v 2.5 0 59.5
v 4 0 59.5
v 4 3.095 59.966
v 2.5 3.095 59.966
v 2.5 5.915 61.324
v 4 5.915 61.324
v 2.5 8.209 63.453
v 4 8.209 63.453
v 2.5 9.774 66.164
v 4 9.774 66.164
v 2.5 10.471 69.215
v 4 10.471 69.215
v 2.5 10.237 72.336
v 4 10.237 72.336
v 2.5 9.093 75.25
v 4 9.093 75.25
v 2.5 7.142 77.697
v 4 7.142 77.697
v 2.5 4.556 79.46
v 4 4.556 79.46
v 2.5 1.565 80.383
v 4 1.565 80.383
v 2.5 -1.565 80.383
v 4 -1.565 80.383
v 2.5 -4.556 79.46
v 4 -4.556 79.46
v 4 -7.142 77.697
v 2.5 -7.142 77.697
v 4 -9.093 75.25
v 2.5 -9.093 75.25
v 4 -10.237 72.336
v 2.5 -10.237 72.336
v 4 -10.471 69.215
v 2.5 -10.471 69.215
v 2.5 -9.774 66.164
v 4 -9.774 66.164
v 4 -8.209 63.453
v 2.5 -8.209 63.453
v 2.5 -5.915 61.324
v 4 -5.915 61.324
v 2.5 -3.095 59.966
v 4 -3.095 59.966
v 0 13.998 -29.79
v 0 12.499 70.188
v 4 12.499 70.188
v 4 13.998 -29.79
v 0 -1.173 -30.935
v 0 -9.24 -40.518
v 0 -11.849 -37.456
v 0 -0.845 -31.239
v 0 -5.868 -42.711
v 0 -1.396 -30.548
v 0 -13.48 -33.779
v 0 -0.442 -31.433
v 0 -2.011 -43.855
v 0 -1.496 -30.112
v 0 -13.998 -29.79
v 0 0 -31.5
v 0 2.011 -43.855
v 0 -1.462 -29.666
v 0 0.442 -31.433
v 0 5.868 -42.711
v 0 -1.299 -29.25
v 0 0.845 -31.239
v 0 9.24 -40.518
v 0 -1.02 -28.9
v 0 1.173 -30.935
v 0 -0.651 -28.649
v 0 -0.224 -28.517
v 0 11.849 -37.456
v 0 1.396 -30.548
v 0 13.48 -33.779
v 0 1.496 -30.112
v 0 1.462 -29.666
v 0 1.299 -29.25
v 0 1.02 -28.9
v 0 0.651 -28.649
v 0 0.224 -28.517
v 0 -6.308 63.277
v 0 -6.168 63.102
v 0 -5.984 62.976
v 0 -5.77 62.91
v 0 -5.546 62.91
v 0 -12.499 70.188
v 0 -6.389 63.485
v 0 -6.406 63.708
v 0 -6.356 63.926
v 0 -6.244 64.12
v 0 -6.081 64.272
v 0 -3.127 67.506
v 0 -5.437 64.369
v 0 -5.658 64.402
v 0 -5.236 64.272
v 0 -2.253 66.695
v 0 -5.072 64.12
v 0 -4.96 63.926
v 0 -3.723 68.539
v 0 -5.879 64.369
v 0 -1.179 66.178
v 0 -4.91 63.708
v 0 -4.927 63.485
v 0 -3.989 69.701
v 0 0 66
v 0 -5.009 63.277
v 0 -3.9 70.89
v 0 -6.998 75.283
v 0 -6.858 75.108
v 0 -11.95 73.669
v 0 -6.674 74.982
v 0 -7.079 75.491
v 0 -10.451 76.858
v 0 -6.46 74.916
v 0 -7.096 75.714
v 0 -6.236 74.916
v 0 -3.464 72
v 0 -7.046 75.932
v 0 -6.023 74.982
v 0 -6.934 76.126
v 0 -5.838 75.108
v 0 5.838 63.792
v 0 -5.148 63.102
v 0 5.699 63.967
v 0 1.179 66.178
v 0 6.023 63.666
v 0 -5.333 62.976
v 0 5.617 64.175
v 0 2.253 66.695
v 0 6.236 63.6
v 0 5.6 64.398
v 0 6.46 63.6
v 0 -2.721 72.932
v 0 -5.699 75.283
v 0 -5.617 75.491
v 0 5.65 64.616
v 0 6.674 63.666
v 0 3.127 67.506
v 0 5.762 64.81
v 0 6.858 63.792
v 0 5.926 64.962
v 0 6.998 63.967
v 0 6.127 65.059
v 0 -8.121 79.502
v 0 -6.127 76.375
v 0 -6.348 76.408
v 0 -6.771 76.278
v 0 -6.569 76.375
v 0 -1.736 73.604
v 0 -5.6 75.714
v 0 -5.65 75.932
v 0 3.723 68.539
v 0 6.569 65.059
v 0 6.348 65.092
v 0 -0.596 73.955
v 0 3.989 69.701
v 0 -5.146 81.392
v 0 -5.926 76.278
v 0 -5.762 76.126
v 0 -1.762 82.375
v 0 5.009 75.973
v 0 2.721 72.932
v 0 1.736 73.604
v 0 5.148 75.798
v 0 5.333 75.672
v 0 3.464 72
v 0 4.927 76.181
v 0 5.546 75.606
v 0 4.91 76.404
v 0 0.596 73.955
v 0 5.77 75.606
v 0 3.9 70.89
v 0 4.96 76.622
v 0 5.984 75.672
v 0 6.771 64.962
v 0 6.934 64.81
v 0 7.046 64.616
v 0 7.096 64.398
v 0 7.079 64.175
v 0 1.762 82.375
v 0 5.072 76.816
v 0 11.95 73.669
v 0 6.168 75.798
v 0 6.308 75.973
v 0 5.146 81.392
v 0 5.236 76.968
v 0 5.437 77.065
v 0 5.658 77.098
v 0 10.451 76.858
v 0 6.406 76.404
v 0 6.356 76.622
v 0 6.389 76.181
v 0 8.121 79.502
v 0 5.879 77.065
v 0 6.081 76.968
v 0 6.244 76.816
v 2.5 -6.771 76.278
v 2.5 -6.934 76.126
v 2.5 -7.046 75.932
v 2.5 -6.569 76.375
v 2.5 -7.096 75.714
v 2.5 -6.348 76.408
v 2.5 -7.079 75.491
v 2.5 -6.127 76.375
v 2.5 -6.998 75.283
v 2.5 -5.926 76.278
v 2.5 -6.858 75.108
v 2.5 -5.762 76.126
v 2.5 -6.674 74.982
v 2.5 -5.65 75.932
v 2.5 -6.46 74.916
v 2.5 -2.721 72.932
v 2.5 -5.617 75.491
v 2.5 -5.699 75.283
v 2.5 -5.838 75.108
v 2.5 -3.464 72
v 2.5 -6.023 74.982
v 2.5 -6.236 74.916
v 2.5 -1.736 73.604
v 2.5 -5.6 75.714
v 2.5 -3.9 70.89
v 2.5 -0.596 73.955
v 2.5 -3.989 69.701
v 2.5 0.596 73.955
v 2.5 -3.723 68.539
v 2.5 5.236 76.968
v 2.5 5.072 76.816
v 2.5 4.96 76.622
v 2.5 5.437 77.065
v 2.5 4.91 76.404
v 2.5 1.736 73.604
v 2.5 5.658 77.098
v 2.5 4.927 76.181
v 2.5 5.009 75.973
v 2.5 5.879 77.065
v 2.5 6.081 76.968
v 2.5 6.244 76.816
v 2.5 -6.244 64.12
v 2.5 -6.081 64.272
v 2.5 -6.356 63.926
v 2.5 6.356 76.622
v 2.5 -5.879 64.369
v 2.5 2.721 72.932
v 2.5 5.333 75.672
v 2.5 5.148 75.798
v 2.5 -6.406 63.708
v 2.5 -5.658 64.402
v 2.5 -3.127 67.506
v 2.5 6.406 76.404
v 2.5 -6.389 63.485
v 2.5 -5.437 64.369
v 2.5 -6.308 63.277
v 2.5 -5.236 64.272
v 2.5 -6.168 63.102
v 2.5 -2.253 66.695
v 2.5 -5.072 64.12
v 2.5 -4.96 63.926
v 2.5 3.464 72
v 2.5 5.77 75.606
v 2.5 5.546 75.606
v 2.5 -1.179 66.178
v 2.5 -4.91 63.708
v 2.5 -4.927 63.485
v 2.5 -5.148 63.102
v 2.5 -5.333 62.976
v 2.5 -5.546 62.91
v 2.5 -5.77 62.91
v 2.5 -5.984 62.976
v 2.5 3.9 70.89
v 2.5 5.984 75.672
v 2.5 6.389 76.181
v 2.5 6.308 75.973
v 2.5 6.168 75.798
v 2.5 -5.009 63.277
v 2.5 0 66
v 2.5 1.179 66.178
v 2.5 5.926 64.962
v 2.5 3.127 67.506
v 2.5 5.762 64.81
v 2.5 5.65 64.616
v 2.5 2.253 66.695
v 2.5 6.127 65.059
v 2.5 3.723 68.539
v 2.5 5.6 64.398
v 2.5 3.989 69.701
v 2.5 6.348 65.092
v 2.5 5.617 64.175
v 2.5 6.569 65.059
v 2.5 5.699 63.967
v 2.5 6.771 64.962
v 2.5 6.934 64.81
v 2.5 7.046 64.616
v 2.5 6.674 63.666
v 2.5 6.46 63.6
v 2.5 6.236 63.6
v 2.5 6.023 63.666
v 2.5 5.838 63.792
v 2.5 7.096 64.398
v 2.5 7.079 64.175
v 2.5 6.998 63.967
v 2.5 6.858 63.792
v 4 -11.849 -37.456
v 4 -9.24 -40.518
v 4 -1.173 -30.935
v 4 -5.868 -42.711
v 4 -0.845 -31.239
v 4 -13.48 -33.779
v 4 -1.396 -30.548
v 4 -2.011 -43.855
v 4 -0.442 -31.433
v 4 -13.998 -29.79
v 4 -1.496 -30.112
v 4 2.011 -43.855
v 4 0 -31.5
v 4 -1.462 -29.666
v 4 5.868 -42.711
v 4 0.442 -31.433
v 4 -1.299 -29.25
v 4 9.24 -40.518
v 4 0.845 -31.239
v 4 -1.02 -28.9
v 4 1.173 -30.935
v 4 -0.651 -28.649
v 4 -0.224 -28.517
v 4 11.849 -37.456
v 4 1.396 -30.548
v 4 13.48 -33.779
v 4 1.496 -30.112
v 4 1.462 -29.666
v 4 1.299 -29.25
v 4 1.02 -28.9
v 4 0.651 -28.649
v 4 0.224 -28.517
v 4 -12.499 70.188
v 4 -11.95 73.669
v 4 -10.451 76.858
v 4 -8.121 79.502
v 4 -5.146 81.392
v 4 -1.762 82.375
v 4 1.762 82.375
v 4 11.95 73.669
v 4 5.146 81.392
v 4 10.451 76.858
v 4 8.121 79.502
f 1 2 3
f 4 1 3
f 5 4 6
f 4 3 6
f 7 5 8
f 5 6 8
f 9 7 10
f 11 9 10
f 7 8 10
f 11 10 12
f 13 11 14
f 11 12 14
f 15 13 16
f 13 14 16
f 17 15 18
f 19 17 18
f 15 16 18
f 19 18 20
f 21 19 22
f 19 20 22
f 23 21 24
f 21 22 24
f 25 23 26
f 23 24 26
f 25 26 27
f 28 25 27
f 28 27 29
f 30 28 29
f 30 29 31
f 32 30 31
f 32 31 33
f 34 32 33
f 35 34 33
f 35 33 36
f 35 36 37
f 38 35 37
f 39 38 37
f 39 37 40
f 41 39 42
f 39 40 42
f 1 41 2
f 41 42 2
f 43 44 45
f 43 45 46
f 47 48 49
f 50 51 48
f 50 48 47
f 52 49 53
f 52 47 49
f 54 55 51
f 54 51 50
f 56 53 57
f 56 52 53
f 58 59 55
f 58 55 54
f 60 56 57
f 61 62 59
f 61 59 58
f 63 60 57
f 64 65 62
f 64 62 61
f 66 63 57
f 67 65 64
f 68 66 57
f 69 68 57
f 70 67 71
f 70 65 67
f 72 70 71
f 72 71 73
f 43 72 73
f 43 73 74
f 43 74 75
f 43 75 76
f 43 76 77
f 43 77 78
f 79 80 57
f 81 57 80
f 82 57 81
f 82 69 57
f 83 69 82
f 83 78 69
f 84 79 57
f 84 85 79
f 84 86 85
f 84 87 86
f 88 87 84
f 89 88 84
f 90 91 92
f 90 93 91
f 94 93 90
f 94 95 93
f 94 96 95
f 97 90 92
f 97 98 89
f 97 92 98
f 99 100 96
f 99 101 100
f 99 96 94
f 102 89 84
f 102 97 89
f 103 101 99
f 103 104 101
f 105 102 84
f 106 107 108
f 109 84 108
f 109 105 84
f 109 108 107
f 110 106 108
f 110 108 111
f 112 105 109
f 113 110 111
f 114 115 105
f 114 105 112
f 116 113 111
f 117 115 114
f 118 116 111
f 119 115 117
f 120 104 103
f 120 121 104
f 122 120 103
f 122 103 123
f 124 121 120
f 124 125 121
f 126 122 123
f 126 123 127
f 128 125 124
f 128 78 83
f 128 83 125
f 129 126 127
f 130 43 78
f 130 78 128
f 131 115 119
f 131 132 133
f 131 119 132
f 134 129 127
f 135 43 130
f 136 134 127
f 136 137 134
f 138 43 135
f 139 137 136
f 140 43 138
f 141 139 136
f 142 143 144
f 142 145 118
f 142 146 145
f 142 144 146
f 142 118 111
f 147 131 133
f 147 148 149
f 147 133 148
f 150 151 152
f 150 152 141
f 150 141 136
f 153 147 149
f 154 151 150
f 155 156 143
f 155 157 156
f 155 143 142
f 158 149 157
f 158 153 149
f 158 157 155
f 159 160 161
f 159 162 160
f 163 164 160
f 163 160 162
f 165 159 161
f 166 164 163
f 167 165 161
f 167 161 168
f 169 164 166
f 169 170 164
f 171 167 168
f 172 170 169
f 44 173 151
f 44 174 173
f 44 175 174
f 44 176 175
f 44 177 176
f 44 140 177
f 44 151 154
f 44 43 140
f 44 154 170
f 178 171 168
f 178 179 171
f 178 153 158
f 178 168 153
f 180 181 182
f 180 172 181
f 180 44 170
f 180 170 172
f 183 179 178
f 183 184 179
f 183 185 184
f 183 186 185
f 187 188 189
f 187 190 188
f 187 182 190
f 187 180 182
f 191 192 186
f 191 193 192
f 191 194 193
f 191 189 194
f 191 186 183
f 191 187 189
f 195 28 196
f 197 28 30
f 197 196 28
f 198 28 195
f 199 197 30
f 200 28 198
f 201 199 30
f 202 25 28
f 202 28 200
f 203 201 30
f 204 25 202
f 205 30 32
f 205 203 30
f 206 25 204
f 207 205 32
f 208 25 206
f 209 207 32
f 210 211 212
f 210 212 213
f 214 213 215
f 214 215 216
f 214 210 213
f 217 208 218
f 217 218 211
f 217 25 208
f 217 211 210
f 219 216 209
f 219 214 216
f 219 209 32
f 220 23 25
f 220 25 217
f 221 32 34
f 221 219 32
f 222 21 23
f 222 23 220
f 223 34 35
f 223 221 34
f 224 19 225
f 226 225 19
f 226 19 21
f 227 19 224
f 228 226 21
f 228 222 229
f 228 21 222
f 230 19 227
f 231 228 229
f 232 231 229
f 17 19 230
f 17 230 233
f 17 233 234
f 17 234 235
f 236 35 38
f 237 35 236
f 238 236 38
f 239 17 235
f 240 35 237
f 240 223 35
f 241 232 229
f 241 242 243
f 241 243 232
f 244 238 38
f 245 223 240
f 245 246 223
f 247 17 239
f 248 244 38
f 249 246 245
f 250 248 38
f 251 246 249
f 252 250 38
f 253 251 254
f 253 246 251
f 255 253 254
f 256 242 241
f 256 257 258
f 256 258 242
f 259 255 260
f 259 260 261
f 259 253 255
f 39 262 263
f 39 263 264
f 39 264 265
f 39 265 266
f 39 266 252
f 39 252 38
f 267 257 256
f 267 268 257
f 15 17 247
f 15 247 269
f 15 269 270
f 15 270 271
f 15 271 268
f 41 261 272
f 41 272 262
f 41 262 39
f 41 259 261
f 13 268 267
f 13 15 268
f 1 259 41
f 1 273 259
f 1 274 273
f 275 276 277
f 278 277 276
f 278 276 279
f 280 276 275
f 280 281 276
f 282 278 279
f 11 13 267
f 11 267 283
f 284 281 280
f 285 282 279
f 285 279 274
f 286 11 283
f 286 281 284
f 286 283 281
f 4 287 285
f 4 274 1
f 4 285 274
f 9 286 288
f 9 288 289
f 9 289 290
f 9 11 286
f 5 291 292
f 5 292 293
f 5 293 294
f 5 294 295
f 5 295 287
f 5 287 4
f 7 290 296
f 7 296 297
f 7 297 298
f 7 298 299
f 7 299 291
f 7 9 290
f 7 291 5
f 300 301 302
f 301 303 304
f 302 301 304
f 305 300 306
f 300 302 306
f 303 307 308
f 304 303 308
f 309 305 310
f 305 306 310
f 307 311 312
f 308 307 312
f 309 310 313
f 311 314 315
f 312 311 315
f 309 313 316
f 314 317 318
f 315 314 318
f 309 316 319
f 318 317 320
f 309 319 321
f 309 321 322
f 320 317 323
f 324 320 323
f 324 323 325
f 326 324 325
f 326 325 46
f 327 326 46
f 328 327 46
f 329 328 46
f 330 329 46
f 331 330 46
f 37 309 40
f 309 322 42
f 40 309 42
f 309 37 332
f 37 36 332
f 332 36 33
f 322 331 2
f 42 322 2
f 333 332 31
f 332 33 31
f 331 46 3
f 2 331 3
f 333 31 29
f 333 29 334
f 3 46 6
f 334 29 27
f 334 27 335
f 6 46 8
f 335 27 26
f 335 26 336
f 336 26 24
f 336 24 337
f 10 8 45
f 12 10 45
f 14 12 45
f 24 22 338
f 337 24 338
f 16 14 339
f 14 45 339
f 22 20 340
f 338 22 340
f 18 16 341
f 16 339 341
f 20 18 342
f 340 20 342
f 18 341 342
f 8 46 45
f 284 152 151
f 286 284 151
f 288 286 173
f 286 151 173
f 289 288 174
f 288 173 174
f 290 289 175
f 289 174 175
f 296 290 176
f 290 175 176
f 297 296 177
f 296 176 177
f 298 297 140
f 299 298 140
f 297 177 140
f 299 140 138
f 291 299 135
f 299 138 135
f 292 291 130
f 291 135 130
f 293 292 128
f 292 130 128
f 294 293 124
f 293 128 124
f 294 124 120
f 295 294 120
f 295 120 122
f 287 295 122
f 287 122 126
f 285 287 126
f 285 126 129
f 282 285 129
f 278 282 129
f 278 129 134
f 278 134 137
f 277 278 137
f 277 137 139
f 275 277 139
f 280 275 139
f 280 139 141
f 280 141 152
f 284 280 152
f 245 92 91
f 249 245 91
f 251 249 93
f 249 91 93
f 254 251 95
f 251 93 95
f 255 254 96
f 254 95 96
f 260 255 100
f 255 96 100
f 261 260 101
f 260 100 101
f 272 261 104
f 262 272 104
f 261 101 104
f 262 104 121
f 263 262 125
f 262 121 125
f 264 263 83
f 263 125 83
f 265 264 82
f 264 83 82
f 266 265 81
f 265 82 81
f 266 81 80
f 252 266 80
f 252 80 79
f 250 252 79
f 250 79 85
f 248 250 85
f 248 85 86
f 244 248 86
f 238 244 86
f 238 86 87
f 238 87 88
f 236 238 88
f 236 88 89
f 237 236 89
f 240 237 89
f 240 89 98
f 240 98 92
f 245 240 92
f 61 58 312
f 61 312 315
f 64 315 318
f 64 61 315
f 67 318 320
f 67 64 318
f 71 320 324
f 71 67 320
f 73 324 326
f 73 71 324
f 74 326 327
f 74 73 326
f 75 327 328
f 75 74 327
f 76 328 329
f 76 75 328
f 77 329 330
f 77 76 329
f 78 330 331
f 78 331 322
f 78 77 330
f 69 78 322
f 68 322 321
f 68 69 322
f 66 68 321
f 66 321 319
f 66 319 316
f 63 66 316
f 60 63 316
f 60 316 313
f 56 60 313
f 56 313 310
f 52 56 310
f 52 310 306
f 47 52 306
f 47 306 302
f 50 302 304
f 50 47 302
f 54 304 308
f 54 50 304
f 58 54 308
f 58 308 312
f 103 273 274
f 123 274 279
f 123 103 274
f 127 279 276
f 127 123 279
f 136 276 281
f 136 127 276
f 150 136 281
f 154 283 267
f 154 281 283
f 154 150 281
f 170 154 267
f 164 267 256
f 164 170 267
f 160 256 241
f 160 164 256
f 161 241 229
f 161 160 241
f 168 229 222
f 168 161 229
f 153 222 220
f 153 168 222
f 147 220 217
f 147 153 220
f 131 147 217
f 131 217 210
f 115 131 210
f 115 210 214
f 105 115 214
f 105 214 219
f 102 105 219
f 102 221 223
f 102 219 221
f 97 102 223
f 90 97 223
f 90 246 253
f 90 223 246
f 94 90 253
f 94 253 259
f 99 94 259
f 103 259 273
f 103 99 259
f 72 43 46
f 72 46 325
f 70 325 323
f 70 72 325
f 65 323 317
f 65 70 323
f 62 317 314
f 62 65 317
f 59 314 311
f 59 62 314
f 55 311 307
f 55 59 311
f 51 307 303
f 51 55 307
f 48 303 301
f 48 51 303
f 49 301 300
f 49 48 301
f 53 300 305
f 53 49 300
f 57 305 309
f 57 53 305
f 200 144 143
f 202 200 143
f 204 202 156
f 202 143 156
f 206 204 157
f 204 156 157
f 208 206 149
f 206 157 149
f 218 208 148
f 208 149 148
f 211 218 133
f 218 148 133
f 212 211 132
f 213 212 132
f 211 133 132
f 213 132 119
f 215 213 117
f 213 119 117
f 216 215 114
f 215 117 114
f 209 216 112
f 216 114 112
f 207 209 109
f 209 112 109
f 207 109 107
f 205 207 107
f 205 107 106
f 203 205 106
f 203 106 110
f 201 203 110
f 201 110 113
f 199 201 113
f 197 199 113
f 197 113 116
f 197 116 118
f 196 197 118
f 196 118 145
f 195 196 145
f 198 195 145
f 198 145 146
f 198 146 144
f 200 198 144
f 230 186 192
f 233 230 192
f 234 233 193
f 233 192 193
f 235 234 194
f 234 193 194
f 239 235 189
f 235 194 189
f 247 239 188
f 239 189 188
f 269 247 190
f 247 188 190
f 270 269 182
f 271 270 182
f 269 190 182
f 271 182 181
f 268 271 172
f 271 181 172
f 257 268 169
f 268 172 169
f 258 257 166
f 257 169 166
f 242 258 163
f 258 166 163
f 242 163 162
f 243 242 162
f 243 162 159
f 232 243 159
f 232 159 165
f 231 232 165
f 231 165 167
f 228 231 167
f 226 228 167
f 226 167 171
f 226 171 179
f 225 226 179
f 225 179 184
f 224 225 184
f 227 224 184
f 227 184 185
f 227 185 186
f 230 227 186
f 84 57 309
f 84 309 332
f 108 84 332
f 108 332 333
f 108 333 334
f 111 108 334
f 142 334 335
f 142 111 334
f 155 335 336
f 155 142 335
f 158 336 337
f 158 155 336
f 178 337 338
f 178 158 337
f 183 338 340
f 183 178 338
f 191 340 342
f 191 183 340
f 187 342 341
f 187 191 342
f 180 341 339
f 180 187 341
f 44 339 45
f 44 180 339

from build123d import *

# Parameters (mm, degrees)
CROQUIS1_R              = 1.5
CROQUIS1_R_2            = 4
SALIENTE_EXTRUIR1_DEPTH = 4
CROQUIS2_R              = 10.5
CORTAR_EXTRUIR1_DEPTH   = 1.5
CROQUIS3_R              = 0.75
CORTAR_EXTRUIR2_DEPTH   = 10


with BuildPart() as part:
    # Croquis1 → Saliente-Extruir1 (new body)
    with BuildSketch(Plane(origin=(0, 0, 0), x_dir=(0, 0, -1), z_dir=(1, 0, 0))):
        with BuildLine():
            Line((-70.1875, 12.498593671), (29.79, 13.998424911))
            ThreePointArc((29.79, 13.998424911), (44, 0), (29.79, -13.998424911))
            Line((29.79, -13.998424911), (-70.1875, -12.498593671))
            ThreePointArc((-70.1875, -12.498593671), (-82.5, 0), (-70.1875, 12.498593671))
        make_face()
        with Locations((30, 0)):
            Circle(CROQUIS1_R, mode=Mode.SUBTRACT)
        with Locations((-70, 0)):
            Circle(CROQUIS1_R_2, mode=Mode.SUBTRACT)
    extrude(amount=SALIENTE_EXTRUIR1_DEPTH)

    # Croquis2 → Cortar-Extruir1 (cut)
    with BuildSketch(Plane(origin=(4, 0, 0), x_dir=(0, 0, -1), z_dir=(1, 0, 0))):
        with Locations((-70, 0)):
            Circle(CROQUIS2_R)
    extrude(amount=-CORTAR_EXTRUIR1_DEPTH, mode=Mode.SUBTRACT)

    # Croquis3 → Cortar-Extruir2 (cut)
    with BuildSketch(Plane.ZY):
        with Locations((63.65189161, -5.658093307)):
            Circle(CROQUIS3_R)
        with Locations((76.34810839, 5.658093307)):
            Circle(CROQUIS3_R)
        with Locations((64.341906693, 6.34810839)):
            Circle(CROQUIS3_R)
        with Locations((75.658093307, -6.34810839)):
            Circle(CROQUIS3_R)
    extrude(amount=-CORTAR_EXTRUIR2_DEPTH, mode=Mode.SUBTRACT)


solid = part.part
